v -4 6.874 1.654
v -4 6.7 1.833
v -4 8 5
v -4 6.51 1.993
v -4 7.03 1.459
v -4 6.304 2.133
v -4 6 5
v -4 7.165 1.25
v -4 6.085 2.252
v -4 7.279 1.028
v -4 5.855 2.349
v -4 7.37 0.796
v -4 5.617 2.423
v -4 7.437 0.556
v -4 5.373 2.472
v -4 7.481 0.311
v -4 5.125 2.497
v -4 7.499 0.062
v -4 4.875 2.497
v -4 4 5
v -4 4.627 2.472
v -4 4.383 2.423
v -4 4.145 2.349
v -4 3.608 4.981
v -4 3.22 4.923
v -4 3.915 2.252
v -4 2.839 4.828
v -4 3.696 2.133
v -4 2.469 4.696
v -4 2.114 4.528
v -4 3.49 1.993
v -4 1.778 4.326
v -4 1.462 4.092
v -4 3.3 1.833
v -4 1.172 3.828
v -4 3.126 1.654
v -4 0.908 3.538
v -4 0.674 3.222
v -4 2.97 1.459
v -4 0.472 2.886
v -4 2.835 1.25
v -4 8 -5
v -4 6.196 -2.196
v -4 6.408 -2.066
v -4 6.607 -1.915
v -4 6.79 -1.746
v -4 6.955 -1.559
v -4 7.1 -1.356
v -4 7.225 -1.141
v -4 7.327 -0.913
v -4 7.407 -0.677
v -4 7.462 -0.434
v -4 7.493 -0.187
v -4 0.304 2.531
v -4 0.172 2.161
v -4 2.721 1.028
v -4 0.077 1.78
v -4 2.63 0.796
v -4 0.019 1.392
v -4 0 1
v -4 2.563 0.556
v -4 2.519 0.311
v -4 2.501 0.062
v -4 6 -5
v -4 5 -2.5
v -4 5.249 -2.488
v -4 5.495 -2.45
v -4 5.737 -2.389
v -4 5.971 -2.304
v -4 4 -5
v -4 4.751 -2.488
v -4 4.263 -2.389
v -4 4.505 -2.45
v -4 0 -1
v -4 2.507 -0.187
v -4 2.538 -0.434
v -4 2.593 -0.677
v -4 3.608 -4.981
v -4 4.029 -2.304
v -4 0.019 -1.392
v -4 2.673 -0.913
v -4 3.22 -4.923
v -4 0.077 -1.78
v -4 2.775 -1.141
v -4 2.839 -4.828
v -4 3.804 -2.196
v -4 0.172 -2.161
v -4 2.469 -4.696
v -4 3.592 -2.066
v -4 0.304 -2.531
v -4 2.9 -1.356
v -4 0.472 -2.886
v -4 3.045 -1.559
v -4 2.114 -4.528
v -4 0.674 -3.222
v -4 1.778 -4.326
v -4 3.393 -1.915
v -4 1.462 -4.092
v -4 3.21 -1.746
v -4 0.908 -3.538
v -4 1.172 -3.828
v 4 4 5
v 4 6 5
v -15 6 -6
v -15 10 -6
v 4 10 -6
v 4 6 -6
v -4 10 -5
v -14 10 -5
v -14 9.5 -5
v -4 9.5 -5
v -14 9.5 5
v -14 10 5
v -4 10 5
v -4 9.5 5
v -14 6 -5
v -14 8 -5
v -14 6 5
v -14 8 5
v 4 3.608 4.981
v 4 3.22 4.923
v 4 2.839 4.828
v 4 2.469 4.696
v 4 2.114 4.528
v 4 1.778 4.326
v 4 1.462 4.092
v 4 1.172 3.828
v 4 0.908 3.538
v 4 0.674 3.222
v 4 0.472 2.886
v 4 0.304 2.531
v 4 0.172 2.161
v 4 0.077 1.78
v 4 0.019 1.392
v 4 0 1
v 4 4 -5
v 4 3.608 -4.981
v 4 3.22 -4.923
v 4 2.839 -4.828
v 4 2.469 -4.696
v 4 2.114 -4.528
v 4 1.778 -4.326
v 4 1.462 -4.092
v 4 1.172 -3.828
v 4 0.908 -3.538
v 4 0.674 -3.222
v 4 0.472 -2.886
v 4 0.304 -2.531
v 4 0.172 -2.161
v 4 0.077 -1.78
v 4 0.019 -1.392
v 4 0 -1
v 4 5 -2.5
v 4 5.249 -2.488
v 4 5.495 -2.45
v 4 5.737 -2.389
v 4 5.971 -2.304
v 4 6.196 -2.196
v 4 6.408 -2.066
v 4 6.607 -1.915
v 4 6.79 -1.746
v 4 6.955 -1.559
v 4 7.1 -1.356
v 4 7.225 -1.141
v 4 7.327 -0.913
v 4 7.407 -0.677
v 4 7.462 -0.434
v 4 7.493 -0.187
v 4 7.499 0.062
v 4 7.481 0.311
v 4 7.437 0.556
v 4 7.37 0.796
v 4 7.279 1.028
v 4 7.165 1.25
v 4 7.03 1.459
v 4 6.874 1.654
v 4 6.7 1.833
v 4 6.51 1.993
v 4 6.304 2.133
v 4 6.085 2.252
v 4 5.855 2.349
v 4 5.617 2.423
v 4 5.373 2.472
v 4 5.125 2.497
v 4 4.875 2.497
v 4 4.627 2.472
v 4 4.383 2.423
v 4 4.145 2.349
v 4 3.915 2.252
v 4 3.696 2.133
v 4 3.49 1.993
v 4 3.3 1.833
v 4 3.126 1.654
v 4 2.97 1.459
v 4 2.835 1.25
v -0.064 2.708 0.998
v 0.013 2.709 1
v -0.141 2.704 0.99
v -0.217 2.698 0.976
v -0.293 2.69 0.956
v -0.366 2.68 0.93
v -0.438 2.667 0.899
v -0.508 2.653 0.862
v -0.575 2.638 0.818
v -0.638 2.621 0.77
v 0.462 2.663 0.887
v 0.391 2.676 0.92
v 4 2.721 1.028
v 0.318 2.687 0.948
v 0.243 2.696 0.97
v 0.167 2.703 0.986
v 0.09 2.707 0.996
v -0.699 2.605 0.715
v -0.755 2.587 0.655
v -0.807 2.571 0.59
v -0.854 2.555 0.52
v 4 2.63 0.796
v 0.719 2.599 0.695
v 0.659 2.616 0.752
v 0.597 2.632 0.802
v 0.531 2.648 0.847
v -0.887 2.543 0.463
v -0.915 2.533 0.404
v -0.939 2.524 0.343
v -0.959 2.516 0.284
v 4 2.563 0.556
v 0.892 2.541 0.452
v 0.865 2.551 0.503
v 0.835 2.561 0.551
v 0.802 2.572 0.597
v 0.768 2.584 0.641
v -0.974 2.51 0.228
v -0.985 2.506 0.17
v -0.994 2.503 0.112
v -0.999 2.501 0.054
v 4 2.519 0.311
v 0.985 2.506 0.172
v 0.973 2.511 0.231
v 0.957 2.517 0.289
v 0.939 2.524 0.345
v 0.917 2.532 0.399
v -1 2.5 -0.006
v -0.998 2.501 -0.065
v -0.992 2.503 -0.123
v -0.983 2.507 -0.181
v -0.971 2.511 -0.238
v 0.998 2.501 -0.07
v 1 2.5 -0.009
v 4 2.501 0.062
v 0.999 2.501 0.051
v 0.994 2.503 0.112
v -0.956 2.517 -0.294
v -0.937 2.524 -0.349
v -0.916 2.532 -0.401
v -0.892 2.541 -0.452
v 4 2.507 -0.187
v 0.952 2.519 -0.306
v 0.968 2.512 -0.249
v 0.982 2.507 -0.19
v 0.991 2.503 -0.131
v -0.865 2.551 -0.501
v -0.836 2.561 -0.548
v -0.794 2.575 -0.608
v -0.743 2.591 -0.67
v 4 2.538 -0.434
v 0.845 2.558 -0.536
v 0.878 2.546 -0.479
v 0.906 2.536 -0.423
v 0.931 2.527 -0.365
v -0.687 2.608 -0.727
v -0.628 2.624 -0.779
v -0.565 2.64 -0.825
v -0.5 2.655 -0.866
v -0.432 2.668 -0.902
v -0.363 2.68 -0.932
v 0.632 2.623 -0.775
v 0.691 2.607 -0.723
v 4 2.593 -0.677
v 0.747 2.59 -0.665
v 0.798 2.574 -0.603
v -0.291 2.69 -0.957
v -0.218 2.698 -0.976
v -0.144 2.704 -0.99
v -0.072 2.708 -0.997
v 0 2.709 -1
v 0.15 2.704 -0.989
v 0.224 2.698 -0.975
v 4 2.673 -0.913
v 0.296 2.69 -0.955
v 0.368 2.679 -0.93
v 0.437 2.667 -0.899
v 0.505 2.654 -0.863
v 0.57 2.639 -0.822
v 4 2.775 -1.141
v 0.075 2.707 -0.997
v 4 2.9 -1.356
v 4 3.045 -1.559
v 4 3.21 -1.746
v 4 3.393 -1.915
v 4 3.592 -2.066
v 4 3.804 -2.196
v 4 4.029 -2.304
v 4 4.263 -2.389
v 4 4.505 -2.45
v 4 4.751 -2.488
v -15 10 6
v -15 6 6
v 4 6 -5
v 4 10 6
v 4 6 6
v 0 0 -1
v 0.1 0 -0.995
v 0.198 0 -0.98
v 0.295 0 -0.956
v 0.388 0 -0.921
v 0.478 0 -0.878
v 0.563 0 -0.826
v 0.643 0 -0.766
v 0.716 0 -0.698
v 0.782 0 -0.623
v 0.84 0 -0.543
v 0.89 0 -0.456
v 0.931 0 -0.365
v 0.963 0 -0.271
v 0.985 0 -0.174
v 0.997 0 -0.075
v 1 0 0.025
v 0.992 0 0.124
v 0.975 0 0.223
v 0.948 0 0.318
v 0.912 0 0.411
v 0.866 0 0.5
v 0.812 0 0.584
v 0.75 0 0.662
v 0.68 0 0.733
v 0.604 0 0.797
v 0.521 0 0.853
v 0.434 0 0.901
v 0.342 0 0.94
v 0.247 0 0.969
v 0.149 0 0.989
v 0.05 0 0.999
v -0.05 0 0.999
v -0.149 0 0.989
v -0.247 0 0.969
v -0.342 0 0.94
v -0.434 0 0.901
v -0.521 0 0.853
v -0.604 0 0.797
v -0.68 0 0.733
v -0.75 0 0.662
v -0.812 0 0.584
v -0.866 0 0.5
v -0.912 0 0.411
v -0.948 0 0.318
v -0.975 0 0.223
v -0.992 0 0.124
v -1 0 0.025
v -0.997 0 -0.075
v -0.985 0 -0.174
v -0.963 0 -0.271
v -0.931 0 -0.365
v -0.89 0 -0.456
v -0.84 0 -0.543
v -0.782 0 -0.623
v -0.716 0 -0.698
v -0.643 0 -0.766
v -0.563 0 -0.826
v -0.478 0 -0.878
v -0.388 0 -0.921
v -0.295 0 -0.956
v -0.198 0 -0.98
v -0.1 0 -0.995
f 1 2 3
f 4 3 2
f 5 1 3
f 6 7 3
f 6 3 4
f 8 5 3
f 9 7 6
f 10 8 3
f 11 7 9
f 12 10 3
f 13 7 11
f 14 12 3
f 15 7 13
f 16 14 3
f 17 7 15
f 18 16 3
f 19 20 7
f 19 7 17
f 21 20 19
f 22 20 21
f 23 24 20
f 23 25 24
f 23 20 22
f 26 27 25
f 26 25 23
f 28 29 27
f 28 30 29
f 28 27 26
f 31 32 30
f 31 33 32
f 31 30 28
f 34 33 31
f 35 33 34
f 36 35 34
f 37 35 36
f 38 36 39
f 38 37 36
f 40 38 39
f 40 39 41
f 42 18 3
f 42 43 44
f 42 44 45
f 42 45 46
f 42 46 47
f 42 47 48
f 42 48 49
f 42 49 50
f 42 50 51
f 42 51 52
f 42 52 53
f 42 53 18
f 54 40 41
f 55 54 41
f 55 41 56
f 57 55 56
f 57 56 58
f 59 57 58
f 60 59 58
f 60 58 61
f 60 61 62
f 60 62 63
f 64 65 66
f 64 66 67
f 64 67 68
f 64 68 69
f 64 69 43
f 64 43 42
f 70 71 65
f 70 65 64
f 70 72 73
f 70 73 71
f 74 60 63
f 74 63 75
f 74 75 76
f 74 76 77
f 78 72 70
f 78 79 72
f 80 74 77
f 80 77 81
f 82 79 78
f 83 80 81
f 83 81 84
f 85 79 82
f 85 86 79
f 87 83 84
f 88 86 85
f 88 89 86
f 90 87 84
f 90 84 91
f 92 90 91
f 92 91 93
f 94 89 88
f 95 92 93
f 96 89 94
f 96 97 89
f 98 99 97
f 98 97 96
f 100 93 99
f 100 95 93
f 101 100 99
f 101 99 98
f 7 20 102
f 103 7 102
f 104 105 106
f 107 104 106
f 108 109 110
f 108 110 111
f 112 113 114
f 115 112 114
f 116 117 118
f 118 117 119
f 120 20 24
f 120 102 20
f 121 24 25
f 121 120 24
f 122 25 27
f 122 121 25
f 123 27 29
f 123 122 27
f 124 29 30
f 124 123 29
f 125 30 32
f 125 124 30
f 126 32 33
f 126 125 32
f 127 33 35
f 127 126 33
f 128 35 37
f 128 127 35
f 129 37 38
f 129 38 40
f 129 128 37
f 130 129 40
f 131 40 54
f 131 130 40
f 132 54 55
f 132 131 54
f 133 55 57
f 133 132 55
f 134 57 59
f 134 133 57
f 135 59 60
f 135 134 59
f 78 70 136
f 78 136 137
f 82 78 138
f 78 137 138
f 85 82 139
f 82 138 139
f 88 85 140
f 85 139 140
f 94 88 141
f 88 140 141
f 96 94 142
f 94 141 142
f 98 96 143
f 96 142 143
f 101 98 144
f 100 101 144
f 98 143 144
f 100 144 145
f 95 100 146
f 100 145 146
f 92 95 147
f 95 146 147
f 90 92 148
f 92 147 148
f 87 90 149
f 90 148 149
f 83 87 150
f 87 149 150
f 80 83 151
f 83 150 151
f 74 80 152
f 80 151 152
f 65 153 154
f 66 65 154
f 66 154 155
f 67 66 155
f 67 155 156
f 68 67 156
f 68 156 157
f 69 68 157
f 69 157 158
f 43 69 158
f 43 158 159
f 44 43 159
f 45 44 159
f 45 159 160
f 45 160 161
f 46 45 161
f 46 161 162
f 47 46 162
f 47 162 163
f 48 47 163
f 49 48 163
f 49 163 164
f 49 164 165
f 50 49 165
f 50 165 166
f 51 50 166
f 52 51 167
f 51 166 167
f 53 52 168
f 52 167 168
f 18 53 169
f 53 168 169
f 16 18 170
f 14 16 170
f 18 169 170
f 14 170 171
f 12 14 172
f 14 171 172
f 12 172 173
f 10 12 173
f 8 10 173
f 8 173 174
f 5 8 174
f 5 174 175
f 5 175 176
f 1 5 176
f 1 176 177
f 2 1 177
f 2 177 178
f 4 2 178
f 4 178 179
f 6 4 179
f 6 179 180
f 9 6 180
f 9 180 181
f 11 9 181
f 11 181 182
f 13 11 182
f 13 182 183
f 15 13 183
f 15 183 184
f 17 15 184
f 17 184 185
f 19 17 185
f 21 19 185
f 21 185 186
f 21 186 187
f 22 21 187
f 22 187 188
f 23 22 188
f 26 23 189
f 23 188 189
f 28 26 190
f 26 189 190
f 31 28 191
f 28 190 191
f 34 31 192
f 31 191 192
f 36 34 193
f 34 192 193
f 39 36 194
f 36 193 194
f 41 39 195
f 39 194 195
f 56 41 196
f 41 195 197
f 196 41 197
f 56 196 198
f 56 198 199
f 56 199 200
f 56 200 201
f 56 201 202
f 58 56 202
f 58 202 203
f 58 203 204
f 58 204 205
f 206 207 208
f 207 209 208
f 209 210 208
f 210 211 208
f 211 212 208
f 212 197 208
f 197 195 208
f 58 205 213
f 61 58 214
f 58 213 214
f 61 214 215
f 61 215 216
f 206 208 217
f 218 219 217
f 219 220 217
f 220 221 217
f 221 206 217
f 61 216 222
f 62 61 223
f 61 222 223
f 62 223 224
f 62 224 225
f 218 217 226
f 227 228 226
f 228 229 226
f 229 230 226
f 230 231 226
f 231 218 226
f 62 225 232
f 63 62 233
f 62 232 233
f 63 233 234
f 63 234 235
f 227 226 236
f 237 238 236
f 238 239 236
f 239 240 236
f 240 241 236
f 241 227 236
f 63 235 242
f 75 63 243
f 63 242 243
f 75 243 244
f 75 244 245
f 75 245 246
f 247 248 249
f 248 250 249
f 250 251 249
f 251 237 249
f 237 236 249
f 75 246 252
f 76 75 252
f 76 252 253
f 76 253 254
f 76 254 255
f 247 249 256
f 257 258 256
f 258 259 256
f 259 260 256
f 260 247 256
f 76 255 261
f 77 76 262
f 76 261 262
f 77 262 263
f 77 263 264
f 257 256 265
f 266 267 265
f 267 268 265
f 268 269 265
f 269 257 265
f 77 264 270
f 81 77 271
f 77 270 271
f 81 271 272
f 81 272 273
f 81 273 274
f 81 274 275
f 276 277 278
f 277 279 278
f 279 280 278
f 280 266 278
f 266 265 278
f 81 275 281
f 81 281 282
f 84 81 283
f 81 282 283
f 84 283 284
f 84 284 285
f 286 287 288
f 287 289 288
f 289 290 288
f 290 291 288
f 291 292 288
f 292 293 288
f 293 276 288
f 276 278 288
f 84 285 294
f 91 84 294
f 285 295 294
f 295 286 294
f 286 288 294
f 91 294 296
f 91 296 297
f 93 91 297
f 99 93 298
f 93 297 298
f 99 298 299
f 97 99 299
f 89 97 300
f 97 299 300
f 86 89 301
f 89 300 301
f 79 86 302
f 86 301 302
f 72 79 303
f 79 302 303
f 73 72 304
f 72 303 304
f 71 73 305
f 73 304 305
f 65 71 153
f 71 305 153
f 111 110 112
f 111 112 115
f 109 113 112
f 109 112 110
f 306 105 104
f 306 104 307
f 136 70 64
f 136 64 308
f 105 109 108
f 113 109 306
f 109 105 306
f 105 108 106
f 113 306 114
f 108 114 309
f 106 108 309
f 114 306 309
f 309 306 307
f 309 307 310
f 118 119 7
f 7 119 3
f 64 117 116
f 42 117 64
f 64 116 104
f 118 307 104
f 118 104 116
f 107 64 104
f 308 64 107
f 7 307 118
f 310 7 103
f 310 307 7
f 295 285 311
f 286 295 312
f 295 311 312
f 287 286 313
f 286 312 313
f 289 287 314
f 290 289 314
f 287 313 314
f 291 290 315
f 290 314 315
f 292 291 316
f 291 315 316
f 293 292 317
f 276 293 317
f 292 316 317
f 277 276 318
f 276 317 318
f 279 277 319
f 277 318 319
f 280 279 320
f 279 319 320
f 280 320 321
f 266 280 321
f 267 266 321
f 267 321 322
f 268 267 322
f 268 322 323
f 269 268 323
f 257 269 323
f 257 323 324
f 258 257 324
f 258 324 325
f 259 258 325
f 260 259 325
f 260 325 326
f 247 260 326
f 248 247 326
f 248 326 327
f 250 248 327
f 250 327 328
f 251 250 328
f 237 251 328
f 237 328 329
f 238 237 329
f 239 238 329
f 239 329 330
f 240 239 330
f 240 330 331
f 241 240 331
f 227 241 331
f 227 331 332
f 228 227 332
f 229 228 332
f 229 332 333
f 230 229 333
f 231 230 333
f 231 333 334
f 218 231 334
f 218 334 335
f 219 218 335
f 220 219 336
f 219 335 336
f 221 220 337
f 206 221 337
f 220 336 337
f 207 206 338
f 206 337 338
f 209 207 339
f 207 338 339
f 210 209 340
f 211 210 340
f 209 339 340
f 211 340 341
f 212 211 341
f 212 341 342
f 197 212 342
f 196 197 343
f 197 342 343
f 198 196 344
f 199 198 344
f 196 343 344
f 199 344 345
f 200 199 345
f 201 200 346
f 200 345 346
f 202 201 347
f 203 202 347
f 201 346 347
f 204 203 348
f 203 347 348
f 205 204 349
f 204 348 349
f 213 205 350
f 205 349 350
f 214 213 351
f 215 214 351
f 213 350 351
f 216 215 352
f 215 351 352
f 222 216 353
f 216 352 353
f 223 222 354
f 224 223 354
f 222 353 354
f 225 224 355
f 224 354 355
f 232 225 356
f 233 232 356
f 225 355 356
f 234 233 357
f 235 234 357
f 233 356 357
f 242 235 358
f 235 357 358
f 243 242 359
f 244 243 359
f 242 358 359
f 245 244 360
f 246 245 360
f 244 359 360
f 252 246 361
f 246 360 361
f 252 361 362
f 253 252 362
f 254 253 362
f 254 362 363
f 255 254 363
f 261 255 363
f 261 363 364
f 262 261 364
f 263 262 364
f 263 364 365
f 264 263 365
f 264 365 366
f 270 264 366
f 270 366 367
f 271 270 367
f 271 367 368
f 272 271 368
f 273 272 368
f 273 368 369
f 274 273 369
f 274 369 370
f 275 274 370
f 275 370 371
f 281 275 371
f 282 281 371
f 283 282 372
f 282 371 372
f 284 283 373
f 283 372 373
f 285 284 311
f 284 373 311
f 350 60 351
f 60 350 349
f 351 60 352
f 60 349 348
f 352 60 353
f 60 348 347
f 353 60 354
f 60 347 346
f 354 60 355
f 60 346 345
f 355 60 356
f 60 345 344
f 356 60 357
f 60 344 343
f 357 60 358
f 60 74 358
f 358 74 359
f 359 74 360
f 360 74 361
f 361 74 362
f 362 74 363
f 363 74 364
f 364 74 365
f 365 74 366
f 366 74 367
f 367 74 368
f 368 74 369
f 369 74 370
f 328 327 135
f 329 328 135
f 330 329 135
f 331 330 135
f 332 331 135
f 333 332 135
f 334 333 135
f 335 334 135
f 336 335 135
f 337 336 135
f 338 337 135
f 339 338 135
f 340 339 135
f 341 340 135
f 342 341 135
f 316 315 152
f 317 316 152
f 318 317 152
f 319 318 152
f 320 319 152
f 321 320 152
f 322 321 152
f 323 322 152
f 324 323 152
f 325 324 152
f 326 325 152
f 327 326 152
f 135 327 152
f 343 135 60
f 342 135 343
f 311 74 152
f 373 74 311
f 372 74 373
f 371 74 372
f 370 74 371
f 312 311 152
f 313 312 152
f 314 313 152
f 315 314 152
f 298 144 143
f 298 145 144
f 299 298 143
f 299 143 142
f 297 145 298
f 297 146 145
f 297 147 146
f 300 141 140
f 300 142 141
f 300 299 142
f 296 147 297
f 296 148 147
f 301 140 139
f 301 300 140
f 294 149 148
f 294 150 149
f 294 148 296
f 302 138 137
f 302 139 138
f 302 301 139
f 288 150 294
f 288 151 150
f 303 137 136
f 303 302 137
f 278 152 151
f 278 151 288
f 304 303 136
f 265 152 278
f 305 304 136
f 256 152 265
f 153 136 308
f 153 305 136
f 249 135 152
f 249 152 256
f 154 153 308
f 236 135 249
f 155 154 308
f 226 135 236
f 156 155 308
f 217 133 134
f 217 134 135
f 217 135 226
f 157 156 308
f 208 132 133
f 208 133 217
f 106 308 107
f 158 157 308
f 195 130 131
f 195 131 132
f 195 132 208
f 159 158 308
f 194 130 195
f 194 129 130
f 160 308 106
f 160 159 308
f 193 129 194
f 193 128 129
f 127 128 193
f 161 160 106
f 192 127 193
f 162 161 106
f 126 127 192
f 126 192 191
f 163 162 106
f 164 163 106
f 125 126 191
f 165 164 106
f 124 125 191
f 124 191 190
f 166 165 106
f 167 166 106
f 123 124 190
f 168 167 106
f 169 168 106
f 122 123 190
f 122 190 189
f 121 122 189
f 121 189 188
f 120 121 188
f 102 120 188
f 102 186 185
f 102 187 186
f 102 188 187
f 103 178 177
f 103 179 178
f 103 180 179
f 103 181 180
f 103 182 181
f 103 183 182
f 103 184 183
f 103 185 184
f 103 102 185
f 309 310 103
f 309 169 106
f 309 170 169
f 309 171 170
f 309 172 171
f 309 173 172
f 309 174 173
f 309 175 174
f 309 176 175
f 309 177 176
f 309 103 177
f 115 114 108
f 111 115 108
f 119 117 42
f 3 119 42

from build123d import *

# Parameters (mm, degrees)
SKETCH2_W               = 8
SKETCH2_H               = 10
BOSS_EXTRUDE1_DEPTH     = 8
SKETCH4_W               = 19
SKETCH4_H               = 10
BOSS_EXTRUDE2_DEPTH     = 2
SKETCH6_W               = 19
SKETCH6_H               = 4
BOSS_EXTRUDE3_DEPTH     = 1
SKETCH7_W               = 1
SKETCH7_H               = 10
BOSS_EXTRUDE4_DEPTH     = 2
CUT_EXTRUDE1_REACH      = 24.293
SKETCH3_R               = 2.5
CUT_EXTRUDE2_REACH      = 21
CUT_EXTRUDE2_END_RADIUS = 2.5
SKETCH8_R               = 1
FILLET3_R               = 4
SKETCH9_W               = 10
SKETCH9_H               = 10
CUT_EXTRUDE3_DEPTH      = 0.5


with BuildPart() as part:
    # Sketch2 → Boss-Extrude1 (new body)
    with BuildSketch(Plane(origin=(0, 0, 0), x_dir=(1, 0, 0), z_dir=(0, 1, 0))):
        Rectangle(SKETCH2_W, SKETCH2_H)
    extrude(amount=BOSS_EXTRUDE1_DEPTH)

    # Sketch4 → Boss-Extrude2 (add)
    with BuildSketch(Plane(origin=(0, 8, 0), x_dir=(1, 0, 0), z_dir=(0, 1, 0))):
        with Locations((-5.5, 0)):
            Rectangle(SKETCH4_W, SKETCH4_H)
    extrude(amount=BOSS_EXTRUDE2_DEPTH)

    # Sketch6 → Boss-Extrude3 (add)
    with BuildSketch(Plane.XY.offset(5)):
        with Locations((-5.5, 8)):
            Rectangle(SKETCH6_W, SKETCH6_H)
    boss_extrude3 = extrude(amount=BOSS_EXTRUDE3_DEPTH)

    # Mirror1: Boss-Extrude3 across plane
    add(boss_extrude3.mirror(Plane.XY))

    # Sketch7 → Boss-Extrude4 (add)
    with BuildSketch(Plane.XZ.offset(-8)):
        with Locations((-14.5, 0)):
            Rectangle(SKETCH7_W, SKETCH7_H)
    extrude(amount=BOSS_EXTRUDE4_DEPTH)

    # Sketch3 → Cut-Extrude1 (cut, up to next)
    with BuildSketch(Plane(origin=(4, 0, 0), x_dir=(0, 0, -1), z_dir=(1, 0, 0)), mode=Mode.PRIVATE) as cut_extrude1_sk1:
        with Locations((0, 5)):
            Circle(SKETCH3_R)
    cut_extrude1_tool1 = extrude(cut_extrude1_sk1.sketch, amount=-CUT_EXTRUDE1_REACH, mode=Mode.PRIVATE) & part.part
    add(cut_extrude1_tool1.solids().sort_by_distance((4, 5, 0))[0], mode=Mode.SUBTRACT)

    # Cut-Extrude2: up to this cylinder (the profile starts outside it)
    cut_extrude2_end = Plane(origin=(0, 5, 0), z_dir=(1, 0, 0)) * Cylinder(CUT_EXTRUDE2_END_RADIUS, 48, mode=Mode.PRIVATE)
    # Sketch8 → Cut-Extrude2 (cut, up to the surface)
    with BuildSketch(Plane.XZ, mode=Mode.PRIVATE) as cut_extrude2_sk1:
        with Locations(Location((0, 0, 0), (0, 0, 270))):
            Circle(SKETCH8_R)
    cut_extrude2_tool1 = extrude(cut_extrude2_sk1.sketch, amount=-CUT_EXTRUDE2_REACH, mode=Mode.PRIVATE) - cut_extrude2_end
    add(cut_extrude2_tool1.solids().sort_by_distance((0, 0, 0))[0], mode=Mode.SUBTRACT)

    # Fillet3
    fillet3_edges = [part.edges().sort_by_distance(p)[0] for p in [
        (0, 0, 5),
        (0, 0, -5),
    ]]
    fillet(fillet3_edges, radius=FILLET3_R - 0.0001)  # a hair under: the kernel refuses the full size

    # Sketch9 → Cut-Extrude3 (cut)
    with BuildSketch(Plane(origin=(0, 10, 0), x_dir=(1, 0, 0), z_dir=(0, 1, 0))):
        with Locations((-9, 0)):
            Rectangle(SKETCH9_W, SKETCH9_H)
    extrude(amount=-CUT_EXTRUDE3_DEPTH, mode=Mode.SUBTRACT)


solid = part.part
